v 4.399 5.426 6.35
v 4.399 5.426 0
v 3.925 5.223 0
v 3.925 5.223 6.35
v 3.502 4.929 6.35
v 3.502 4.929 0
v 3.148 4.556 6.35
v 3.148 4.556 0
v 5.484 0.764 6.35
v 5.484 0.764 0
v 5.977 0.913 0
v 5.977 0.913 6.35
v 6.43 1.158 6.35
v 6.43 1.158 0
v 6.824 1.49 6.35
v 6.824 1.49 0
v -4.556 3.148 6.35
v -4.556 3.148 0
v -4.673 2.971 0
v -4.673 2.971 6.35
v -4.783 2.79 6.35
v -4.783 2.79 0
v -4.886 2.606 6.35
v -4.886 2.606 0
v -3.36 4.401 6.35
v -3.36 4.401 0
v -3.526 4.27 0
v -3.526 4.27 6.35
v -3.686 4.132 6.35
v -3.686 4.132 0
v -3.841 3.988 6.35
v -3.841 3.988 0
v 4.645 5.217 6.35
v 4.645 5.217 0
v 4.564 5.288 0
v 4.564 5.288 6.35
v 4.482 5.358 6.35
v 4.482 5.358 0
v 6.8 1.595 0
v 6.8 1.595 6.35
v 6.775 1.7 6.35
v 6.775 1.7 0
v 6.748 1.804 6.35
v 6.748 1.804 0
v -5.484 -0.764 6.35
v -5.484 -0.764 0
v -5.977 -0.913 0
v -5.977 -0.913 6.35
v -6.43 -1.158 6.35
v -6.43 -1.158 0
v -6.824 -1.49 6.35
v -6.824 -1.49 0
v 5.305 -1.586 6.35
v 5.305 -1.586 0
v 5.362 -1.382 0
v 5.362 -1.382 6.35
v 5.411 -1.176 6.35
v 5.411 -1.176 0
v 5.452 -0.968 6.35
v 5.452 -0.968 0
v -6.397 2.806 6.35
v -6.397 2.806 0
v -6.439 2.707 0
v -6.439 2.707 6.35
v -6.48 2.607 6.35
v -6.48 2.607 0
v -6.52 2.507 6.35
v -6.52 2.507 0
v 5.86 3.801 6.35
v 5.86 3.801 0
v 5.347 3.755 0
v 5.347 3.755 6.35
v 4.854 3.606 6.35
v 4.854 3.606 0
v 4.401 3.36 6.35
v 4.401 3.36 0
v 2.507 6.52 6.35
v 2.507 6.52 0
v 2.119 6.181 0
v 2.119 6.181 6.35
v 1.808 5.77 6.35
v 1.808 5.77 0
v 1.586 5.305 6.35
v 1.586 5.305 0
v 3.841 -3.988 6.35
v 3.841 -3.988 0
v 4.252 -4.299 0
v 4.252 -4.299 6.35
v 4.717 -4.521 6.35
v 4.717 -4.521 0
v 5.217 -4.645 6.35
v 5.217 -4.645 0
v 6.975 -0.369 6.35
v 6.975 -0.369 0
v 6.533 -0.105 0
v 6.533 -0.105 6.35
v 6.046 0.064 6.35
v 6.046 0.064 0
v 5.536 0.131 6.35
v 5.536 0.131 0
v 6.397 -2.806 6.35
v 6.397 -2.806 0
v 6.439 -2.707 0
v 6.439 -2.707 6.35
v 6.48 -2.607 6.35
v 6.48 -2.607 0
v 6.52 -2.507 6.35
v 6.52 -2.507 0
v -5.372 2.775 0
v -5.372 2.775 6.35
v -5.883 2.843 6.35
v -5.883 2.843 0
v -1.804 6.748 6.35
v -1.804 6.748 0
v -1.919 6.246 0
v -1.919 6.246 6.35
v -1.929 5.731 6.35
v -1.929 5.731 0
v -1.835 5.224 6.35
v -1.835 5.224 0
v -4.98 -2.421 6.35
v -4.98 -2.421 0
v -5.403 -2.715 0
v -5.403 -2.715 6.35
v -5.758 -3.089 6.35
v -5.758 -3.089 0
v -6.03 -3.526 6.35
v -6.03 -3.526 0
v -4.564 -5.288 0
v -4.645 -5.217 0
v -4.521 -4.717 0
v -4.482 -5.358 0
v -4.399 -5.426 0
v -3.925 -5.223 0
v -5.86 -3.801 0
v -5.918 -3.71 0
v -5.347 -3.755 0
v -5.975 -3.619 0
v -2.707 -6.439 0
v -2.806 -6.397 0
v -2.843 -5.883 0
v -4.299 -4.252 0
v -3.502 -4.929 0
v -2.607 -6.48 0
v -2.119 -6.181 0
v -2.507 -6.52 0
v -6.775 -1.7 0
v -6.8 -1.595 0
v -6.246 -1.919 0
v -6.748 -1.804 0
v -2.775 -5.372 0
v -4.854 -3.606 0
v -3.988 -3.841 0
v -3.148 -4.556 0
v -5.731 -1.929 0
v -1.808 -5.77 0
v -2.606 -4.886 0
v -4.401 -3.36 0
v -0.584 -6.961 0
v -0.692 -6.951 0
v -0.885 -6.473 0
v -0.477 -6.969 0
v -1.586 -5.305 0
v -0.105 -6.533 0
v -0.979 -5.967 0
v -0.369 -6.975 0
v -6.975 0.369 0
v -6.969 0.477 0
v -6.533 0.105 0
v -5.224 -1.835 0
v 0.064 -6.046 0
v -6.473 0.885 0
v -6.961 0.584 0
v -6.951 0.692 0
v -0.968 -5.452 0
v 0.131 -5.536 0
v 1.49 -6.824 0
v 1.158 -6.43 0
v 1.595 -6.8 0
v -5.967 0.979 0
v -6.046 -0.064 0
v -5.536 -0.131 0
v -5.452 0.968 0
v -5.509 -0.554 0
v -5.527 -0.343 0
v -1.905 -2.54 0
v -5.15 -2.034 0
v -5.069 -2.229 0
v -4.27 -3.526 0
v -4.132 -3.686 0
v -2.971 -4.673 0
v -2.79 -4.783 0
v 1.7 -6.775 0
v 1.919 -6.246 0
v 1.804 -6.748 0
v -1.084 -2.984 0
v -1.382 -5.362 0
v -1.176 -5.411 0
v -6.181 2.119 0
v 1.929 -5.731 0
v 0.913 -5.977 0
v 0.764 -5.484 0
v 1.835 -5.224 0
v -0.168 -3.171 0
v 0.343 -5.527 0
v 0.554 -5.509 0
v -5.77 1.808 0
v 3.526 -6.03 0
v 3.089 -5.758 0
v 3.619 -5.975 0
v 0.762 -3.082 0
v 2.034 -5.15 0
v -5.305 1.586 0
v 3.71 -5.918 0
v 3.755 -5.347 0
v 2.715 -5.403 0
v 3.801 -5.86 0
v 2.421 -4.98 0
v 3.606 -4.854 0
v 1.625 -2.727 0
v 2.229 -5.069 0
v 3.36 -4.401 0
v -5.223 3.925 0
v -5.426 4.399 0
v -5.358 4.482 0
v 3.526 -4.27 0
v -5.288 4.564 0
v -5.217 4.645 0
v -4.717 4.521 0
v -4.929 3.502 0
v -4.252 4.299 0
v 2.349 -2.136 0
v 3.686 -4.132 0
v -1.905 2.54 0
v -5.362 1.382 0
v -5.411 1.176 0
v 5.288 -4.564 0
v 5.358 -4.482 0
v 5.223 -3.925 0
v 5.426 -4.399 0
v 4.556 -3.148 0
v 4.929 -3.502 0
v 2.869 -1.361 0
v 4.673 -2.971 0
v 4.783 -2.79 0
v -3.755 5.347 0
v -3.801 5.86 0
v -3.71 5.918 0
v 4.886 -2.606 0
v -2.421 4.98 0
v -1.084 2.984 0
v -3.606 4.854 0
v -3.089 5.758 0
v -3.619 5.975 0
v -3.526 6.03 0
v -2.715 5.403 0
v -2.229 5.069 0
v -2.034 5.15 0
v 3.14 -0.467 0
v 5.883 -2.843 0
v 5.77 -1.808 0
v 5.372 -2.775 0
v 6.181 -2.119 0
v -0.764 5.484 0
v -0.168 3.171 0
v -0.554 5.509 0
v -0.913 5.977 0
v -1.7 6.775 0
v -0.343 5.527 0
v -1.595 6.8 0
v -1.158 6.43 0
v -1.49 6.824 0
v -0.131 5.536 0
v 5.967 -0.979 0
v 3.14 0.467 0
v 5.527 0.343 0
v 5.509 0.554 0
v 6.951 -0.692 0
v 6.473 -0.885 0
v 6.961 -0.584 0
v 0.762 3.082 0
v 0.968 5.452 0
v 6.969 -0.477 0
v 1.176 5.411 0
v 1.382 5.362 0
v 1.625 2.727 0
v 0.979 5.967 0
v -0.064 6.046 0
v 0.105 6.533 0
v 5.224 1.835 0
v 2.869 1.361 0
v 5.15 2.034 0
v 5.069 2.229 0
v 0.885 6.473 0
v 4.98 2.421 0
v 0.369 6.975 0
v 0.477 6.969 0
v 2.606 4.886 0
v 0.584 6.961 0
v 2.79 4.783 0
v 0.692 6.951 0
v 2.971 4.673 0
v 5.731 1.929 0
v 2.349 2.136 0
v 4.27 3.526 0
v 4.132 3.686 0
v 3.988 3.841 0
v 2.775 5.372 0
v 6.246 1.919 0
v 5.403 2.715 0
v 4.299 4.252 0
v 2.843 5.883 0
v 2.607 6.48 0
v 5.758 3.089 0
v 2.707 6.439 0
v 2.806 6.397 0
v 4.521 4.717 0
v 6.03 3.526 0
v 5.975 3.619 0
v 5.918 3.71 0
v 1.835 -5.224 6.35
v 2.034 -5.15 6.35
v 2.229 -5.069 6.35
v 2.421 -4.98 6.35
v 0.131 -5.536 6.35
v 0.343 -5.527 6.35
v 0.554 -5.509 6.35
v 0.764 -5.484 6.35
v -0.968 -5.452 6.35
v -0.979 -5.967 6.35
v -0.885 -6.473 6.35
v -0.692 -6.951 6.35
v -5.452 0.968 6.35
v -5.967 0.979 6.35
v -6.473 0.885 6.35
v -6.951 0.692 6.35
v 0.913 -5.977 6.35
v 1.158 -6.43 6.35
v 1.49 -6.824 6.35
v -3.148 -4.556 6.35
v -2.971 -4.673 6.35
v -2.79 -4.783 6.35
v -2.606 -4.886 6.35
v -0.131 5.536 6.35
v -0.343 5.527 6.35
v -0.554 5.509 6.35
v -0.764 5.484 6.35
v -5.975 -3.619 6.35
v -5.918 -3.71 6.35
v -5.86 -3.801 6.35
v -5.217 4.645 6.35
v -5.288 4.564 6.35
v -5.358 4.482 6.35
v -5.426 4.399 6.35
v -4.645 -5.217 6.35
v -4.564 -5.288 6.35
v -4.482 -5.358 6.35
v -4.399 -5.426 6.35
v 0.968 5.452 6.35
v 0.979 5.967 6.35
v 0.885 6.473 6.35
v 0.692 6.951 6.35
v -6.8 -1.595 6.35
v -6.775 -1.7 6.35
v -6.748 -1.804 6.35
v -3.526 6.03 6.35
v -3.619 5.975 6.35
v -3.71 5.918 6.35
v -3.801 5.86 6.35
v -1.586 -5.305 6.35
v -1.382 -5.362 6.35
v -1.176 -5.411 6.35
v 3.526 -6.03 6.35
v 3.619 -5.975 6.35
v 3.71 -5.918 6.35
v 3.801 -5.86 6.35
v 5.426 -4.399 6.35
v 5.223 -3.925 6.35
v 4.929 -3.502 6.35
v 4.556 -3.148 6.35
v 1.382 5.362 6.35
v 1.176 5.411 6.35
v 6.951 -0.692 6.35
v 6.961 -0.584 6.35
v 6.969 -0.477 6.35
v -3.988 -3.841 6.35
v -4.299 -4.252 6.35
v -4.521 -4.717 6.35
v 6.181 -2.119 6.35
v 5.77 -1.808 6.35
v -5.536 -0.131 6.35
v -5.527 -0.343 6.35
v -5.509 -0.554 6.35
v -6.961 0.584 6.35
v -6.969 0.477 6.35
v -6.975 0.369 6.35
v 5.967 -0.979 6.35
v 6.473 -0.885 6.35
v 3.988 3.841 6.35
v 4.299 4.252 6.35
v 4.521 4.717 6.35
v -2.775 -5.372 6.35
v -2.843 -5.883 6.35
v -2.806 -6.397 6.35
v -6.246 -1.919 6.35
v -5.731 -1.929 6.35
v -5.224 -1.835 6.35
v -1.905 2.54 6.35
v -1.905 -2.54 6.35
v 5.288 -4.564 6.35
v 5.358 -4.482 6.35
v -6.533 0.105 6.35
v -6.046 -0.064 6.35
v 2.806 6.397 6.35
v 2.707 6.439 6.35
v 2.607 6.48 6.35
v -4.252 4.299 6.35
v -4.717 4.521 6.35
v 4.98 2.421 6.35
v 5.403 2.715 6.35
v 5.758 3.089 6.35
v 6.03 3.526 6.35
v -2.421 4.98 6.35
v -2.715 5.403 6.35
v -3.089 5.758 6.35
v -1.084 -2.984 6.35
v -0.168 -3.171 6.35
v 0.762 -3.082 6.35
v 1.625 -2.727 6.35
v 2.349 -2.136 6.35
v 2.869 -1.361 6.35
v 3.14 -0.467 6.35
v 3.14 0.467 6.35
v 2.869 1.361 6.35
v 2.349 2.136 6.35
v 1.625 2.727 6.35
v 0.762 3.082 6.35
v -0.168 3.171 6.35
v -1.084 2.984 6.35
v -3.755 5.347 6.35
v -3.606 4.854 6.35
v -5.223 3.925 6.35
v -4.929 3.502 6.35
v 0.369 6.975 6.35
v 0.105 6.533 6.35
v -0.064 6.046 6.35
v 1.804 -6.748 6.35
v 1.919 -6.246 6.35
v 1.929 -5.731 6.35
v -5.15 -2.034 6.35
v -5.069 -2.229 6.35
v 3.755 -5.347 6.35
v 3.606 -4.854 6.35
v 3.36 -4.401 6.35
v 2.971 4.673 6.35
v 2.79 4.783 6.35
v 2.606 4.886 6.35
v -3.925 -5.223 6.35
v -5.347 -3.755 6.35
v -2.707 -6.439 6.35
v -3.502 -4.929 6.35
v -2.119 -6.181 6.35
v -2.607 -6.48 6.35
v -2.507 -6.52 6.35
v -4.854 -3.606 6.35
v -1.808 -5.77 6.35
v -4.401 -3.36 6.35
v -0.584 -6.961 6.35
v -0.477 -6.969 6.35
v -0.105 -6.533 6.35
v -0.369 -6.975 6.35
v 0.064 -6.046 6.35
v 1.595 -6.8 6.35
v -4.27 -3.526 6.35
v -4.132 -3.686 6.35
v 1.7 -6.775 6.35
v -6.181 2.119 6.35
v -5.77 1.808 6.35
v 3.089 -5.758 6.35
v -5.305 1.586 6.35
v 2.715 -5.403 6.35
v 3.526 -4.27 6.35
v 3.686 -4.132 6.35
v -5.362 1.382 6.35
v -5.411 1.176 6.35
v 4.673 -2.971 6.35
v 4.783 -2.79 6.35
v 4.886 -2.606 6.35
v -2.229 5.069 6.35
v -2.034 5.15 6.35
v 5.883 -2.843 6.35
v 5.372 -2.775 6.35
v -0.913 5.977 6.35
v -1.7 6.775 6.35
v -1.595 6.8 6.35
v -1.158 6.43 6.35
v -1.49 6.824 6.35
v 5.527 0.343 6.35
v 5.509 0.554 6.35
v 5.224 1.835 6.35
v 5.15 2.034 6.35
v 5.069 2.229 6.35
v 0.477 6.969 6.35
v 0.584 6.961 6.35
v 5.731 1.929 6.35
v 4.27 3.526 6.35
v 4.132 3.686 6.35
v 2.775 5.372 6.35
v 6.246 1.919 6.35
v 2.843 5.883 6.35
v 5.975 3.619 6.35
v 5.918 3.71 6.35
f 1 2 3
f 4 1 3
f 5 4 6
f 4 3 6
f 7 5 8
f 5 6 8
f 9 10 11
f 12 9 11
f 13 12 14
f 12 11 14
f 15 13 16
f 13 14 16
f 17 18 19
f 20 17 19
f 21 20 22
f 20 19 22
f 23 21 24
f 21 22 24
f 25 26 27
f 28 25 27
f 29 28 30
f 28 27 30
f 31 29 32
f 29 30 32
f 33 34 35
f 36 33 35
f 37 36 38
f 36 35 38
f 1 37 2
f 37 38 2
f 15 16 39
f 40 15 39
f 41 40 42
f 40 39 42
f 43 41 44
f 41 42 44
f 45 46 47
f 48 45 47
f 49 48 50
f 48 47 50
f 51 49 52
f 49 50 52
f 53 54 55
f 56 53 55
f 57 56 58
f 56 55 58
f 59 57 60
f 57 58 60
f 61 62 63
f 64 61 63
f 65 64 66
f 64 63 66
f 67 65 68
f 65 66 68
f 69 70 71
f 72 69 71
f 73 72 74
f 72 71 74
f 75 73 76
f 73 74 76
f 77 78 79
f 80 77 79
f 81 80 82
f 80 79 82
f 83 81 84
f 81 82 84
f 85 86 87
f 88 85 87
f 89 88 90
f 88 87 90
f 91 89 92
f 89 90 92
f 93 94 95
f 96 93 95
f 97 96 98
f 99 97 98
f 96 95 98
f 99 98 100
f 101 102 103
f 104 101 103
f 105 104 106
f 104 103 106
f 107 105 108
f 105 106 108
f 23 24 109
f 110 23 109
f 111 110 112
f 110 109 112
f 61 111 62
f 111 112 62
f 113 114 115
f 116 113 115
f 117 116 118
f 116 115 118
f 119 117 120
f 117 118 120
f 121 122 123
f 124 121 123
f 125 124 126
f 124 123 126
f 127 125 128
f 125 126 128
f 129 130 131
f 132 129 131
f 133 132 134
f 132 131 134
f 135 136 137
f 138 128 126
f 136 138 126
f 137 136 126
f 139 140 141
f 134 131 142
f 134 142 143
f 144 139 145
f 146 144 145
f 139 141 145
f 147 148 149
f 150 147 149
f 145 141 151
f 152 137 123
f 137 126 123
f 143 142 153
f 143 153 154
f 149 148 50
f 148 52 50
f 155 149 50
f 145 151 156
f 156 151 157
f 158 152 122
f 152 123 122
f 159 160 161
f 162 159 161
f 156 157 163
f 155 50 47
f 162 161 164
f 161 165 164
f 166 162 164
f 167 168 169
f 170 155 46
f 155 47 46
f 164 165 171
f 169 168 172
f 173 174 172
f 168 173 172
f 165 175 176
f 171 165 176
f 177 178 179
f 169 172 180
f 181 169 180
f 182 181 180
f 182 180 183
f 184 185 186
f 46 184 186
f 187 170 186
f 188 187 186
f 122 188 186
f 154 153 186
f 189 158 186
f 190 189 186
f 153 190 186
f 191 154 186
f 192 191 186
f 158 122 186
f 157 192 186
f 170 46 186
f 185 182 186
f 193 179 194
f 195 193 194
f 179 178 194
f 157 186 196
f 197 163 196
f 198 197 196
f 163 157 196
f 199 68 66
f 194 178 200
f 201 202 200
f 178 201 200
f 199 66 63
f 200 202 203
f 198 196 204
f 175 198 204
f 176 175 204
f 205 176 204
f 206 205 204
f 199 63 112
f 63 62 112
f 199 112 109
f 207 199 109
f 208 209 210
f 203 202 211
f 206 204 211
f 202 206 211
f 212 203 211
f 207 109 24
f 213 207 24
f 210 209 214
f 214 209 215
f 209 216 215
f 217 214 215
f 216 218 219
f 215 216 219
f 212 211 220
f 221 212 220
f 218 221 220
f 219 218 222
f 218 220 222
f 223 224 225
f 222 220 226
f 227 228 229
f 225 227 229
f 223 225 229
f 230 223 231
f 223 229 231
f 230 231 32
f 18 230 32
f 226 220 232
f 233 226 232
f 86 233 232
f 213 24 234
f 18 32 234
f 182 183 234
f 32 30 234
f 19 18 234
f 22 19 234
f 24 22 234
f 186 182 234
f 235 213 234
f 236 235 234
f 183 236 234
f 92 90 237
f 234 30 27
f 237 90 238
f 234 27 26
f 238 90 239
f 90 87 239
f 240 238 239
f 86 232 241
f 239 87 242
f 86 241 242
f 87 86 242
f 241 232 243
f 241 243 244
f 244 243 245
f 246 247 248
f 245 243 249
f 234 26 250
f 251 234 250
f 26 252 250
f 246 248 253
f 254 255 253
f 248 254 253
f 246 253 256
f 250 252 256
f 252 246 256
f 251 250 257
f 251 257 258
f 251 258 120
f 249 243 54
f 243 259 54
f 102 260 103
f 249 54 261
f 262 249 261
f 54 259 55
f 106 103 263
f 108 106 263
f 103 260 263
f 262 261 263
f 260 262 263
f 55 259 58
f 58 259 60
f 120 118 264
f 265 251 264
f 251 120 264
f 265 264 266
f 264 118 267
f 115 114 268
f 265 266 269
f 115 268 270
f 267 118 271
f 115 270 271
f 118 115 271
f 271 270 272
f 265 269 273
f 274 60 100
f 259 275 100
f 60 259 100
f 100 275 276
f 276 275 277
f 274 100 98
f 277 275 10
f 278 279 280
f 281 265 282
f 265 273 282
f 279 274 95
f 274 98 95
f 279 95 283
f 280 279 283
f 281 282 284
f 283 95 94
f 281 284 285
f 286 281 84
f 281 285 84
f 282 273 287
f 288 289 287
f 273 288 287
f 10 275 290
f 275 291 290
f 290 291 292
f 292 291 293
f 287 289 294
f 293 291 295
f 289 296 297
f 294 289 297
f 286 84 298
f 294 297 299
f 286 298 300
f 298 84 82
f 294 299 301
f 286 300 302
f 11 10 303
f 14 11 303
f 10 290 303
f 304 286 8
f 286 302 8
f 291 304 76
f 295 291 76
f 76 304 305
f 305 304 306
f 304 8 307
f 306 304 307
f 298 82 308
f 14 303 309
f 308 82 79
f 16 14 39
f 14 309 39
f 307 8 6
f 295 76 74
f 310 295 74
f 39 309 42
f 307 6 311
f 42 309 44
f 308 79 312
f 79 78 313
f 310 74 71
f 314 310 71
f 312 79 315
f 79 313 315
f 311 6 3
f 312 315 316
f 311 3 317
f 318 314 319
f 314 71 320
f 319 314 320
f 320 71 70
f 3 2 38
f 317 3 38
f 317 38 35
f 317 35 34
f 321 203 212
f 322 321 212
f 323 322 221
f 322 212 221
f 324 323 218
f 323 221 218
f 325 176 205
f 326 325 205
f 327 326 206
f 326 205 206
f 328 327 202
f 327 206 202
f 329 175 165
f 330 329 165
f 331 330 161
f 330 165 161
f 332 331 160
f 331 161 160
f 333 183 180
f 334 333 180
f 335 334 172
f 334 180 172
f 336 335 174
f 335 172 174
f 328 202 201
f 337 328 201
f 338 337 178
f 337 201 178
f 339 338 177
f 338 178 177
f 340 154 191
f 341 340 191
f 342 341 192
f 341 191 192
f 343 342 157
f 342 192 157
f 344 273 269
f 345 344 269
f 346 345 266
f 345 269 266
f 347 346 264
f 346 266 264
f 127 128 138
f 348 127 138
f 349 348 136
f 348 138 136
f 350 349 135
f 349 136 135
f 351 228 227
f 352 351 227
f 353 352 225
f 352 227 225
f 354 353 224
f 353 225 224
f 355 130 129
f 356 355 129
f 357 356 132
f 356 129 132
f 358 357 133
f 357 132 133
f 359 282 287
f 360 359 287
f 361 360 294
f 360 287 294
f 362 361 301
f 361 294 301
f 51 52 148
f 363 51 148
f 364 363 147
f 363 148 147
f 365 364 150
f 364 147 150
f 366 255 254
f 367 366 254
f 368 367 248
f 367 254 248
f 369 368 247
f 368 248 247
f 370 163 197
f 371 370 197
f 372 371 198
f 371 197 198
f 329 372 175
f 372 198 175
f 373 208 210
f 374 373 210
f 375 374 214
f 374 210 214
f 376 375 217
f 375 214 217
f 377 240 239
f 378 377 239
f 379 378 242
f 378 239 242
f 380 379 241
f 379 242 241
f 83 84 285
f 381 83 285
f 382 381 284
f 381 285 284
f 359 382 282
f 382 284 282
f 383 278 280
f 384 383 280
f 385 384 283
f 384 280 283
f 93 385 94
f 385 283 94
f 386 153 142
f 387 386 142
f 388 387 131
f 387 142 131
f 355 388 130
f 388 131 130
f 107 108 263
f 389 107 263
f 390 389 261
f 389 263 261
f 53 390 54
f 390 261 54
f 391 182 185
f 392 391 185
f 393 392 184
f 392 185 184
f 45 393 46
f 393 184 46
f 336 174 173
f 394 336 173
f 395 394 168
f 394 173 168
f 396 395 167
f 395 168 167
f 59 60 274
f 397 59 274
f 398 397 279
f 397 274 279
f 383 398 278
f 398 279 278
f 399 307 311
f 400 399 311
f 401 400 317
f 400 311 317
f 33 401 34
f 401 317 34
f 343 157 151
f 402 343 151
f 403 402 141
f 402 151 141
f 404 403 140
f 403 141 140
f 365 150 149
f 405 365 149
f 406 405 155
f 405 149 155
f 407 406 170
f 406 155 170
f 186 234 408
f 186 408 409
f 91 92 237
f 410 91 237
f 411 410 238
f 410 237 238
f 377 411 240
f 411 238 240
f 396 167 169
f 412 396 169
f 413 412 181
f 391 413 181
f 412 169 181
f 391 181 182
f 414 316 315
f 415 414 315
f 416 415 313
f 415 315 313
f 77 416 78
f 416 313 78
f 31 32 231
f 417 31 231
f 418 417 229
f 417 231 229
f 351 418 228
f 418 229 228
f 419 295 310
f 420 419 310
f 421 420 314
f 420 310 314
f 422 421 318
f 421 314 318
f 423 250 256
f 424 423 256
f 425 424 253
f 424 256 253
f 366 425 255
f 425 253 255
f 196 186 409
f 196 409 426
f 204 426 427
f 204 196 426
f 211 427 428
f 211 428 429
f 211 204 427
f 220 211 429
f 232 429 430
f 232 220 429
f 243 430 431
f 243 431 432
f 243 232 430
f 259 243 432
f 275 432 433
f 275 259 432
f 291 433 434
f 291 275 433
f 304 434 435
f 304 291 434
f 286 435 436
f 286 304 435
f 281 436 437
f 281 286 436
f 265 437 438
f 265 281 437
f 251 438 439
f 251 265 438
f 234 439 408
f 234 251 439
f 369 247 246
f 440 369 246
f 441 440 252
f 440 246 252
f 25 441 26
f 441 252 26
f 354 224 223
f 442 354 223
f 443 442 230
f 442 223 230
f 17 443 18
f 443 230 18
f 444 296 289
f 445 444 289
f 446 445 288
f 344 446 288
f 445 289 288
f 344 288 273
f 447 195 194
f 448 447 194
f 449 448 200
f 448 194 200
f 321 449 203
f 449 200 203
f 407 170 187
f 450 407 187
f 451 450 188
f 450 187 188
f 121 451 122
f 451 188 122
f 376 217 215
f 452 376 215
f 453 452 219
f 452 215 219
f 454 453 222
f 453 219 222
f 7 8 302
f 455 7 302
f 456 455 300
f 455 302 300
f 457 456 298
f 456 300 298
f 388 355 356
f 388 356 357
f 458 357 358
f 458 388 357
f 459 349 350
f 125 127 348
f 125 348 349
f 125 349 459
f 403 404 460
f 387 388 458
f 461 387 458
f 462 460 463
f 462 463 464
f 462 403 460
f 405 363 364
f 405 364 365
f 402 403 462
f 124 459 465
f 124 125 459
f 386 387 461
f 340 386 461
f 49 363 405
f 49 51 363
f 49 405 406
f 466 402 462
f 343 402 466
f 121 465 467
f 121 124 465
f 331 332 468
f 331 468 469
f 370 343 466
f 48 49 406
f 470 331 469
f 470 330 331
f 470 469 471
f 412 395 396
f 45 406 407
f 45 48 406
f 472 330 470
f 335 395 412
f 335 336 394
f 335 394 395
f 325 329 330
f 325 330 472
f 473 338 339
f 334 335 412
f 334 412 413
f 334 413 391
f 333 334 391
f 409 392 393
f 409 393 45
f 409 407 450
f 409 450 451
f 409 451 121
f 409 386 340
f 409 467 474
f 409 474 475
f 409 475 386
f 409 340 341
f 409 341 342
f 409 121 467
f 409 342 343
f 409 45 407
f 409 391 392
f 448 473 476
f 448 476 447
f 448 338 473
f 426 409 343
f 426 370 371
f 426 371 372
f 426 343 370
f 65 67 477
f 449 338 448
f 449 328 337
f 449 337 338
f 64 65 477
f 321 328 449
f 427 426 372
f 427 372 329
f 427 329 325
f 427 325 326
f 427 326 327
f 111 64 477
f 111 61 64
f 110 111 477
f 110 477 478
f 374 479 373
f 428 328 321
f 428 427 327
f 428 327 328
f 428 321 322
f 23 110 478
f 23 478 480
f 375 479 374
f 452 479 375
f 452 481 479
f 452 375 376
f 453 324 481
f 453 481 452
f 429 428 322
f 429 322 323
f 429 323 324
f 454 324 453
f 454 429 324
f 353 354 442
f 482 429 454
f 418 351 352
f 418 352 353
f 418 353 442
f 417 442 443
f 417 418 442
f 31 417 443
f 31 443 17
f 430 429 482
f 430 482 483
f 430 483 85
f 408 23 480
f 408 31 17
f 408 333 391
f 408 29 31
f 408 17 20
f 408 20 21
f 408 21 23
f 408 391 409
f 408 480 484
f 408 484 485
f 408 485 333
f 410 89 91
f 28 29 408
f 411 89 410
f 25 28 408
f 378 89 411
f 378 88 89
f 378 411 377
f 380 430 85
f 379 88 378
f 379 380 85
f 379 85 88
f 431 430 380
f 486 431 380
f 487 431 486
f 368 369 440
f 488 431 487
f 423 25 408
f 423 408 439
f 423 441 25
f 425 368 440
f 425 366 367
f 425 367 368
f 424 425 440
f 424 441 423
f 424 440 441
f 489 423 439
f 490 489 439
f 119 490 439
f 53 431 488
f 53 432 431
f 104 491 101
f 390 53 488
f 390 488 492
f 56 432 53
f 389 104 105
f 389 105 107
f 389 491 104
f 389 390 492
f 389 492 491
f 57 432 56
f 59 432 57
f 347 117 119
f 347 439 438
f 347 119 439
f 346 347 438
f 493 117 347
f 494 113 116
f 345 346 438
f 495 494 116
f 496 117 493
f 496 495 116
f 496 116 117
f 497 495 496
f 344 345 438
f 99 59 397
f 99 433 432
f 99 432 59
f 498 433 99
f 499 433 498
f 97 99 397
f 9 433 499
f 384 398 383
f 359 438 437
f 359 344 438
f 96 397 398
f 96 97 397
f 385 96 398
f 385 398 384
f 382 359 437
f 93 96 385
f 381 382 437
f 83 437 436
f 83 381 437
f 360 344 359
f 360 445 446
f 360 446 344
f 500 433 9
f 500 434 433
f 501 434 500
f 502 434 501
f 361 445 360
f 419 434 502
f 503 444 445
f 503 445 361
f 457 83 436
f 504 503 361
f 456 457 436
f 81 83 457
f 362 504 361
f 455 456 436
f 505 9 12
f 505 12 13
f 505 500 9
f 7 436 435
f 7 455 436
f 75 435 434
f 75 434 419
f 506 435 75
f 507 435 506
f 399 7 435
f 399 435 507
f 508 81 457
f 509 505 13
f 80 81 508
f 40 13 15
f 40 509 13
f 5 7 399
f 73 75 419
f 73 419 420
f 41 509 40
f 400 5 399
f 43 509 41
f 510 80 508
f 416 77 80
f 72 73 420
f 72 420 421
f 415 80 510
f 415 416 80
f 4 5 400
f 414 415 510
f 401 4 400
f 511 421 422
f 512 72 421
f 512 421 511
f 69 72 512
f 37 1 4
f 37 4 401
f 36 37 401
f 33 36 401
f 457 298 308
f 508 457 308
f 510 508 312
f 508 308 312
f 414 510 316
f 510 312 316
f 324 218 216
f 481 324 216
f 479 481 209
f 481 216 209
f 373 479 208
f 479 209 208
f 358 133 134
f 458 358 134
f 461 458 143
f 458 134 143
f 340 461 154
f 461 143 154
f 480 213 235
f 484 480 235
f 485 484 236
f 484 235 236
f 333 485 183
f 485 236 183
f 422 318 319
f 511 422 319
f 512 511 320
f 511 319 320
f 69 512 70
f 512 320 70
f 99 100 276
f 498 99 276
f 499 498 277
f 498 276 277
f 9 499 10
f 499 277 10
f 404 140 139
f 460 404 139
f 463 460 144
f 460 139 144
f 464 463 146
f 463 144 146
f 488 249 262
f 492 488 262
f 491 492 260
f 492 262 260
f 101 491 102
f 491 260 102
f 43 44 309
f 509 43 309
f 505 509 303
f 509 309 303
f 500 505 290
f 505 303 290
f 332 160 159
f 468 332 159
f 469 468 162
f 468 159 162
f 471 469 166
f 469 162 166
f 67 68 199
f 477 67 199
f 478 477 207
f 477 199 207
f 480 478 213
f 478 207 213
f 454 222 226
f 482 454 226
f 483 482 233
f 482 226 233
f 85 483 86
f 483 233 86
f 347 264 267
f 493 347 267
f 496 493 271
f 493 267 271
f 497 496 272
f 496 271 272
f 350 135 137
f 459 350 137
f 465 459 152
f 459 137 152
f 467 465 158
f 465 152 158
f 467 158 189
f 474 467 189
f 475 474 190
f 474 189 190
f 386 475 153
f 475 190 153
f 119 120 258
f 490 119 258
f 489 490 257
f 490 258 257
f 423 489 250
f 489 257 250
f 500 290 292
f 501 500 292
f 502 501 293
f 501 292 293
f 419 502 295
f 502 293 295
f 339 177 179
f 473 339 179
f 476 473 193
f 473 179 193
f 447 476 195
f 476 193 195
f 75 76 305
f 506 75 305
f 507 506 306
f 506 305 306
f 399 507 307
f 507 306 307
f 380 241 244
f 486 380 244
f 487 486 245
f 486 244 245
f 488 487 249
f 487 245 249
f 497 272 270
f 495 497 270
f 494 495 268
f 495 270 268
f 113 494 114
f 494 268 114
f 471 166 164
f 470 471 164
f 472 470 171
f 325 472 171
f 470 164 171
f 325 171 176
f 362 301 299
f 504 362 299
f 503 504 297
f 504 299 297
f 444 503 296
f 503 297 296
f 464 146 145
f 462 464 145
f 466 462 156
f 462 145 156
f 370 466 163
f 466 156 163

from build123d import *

# Parameters (mm, degrees)
BOSS_EXTRUDE1_DEPTH = 6.35


with BuildPart() as part:
    # Sketch1 → Boss-Extrude1 (new body)
    with BuildSketch(Plane.XY):
        with BuildLine():
            ThreePointArc((5.8600974, 3.801247619), (5.096802915, 3.692613372), (4.401264234, 3.359978717))
            ThreePointArc((4.401264234, 3.359978717), (4.201500823, 3.606656994), (3.987930607, 3.841483218))
            ThreePointArc((3.987930607, 3.841483218), (4.422090523, 4.478605685), (4.645099136, 5.216634837))
            ThreePointArc((4.645099136, 5.216634837), (4.523078796, 5.32277965), (4.398633704, 5.426071004))
            ThreePointArc((4.398633704, 5.426071004), (3.706267339, 5.086882728), (3.147560505, 4.555595099))
            ThreePointArc((3.147560505, 4.555595099), (2.881346432, 4.728469793), (2.605663792, 4.885805977))
            ThreePointArc((2.605663792, 4.885805977), (2.82169274, 5.625908243), (2.805722984, 6.396729128))
            ThreePointArc((2.805722984, 6.396729128), (2.656874194, 6.459972486), (2.506601094, 6.519752753))
            ThreePointArc((2.506601094, 6.519752753), (1.952936493, 5.983212559), (1.585751624, 5.305278091))
            ThreePointArc((1.585751624, 5.305278091), (1.279145776, 5.387427022), (0.968336451, 5.451872005))
            ThreePointArc((0.968336451, 5.451872005), (0.945088011, 6.222507704), (0.691703118, 6.950667004))
            ThreePointArc((0.691703118, 6.950667004), (0.530596234, 6.964818206), (0.369204905, 6.975235676))
            ThreePointArc((0.369204905, 6.975235676), (0.008438615, 6.293863858), (-0.131281675, 5.5356435))
            ThreePointArc((-0.131281675, 5.5356435), (-0.44826658, 5.519025359), (-0.763778409, 5.484270816))
            ThreePointArc((-0.763778409, 5.484270816), (-1.024028517, 6.210004756), (-1.490025469, 6.824225165))
            ThreePointArc((-1.490025469, 6.824225165), (-1.647620183, 6.787898993), (-1.804331633, 6.747933933))
            ThreePointArc((-1.804331633, 6.747933933), (-1.936885292, 5.98842791), (-1.835464209, 5.224141554))
            ThreePointArc((-1.835464209, 5.224141554), (-2.13179948, 5.11038304), (-2.421129317, 4.979830988))
            ThreePointArc((-2.421129317, 4.979830988), (-2.892905998, 5.589623275), (-3.525899981, 6.02978062))
            ThreePointArc((-3.525899981, 6.02978062), (-3.664556056, 5.946532932), (-3.801247619, 5.8600974))
            ThreePointArc((-3.801247619, 5.8600974), (-3.692613372, 5.096802915), (-3.359978717, 4.401264234))
            ThreePointArc((-3.359978717, 4.401264234), (-3.606656994, 4.201500823), (-3.841483218, 3.987930607))
            ThreePointArc((-3.841483218, 3.987930607), (-4.478605685, 4.422090523), (-5.216634837, 4.645099136))
            ThreePointArc((-5.216634837, 4.645099136), (-5.32277965, 4.523078796), (-5.426071004, 4.398633704))
            ThreePointArc((-5.426071004, 4.398633704), (-5.086882728, 3.706267339), (-4.555595099, 3.147560505))
            ThreePointArc((-4.555595099, 3.147560505), (-4.728469793, 2.881346432), (-4.885805977, 2.605663792))
            ThreePointArc((-4.885805977, 2.605663792), (-5.625908243, 2.82169274), (-6.396729128, 2.805722984))
            ThreePointArc((-6.396729128, 2.805722984), (-6.459972486, 2.656874194), (-6.519752753, 2.506601094))
            ThreePointArc((-6.519752753, 2.506601094), (-5.983212559, 1.952936493), (-5.305278091, 1.585751624))
            ThreePointArc((-5.305278091, 1.585751624), (-5.387427022, 1.279145776), (-5.451872005, 0.968336451))
            ThreePointArc((-5.451872005, 0.968336451), (-6.222507704, 0.945088011), (-6.950667004, 0.691703118))
            ThreePointArc((-6.950667004, 0.691703118), (-6.964818206, 0.530596234), (-6.975235676, 0.369204905))
            ThreePointArc((-6.975235676, 0.369204905), (-6.293863858, 0.008438615), (-5.5356435, -0.131281675))
            ThreePointArc((-5.5356435, -0.131281675), (-5.519025359, -0.44826658), (-5.484270816, -0.763778409))
            ThreePointArc((-5.484270816, -0.763778409), (-6.210004756, -1.024028517), (-6.824225165, -1.490025469))
            ThreePointArc((-6.824225165, -1.490025469), (-6.787898993, -1.647620183), (-6.747933933, -1.804331633))
            ThreePointArc((-6.747933933, -1.804331633), (-5.98842791, -1.936885292), (-5.224141554, -1.835464209))
            ThreePointArc((-5.224141554, -1.835464209), (-5.11038304, -2.13179948), (-4.979830988, -2.421129317))
            ThreePointArc((-4.979830988, -2.421129317), (-5.589623275, -2.892905998), (-6.02978062, -3.525899981))
            ThreePointArc((-6.02978062, -3.525899981), (-5.946532932, -3.664556056), (-5.8600974, -3.801247619))
            ThreePointArc((-5.8600974, -3.801247619), (-5.096802915, -3.692613372), (-4.401264234, -3.359978717))
            ThreePointArc((-4.401264234, -3.359978717), (-4.201500823, -3.606656994), (-3.987930607, -3.841483218))
            ThreePointArc((-3.987930607, -3.841483218), (-4.422090523, -4.478605685), (-4.645099136, -5.216634837))
            ThreePointArc((-4.645099136, -5.216634837), (-4.523078796, -5.32277965), (-4.398633704, -5.426071004))
            ThreePointArc((-4.398633704, -5.426071004), (-3.706267339, -5.086882728), (-3.147560505, -4.555595099))
            ThreePointArc((-3.147560505, -4.555595099), (-2.881346432, -4.728469793), (-2.605663792, -4.885805977))
            ThreePointArc((-2.605663792, -4.885805977), (-2.82169274, -5.625908243), (-2.805722984, -6.396729128))
            ThreePointArc((-2.805722984, -6.396729128), (-2.656874194, -6.459972486), (-2.506601094, -6.519752753))
            ThreePointArc((-2.506601094, -6.519752753), (-1.952936493, -5.983212559), (-1.585751624, -5.305278091))
            ThreePointArc((-1.585751624, -5.305278091), (-1.279145776, -5.387427022), (-0.968336451, -5.451872005))
            ThreePointArc((-0.968336451, -5.451872005), (-0.945088011, -6.222507704), (-0.691703118, -6.950667004))
            ThreePointArc((-0.691703118, -6.950667004), (-0.530596234, -6.964818206), (-0.369204905, -6.975235676))
            ThreePointArc((-0.369204905, -6.975235676), (-0.008438615, -6.293863858), (0.131281675, -5.5356435))
            ThreePointArc((0.131281675, -5.5356435), (0.44826658, -5.519025359), (0.763778409, -5.484270816))
            ThreePointArc((0.763778409, -5.484270816), (1.024028517, -6.210004756), (1.490025469, -6.824225165))
            ThreePointArc((1.490025469, -6.824225165), (1.647620183, -6.787898993), (1.804331633, -6.747933933))
            ThreePointArc((1.804331633, -6.747933933), (1.936885292, -5.98842791), (1.835464209, -5.224141554))
            ThreePointArc((1.835464209, -5.224141554), (2.13179948, -5.11038304), (2.421129317, -4.979830988))
            ThreePointArc((2.421129317, -4.979830988), (2.892905998, -5.589623275), (3.525899981, -6.02978062))
            ThreePointArc((3.525899981, -6.02978062), (3.664556056, -5.946532932), (3.801247619, -5.8600974))
            ThreePointArc((3.801247619, -5.8600974), (3.692613372, -5.096802915), (3.359978717, -4.401264234))
            ThreePointArc((3.359978717, -4.401264234), (3.606656994, -4.201500823), (3.841483218, -3.987930607))
            ThreePointArc((3.841483218, -3.987930607), (4.478605685, -4.422090523), (5.216634837, -4.645099136))
            ThreePointArc((5.216634837, -4.645099136), (5.32277965, -4.523078796), (5.426071004, -4.398633704))
            ThreePointArc((5.426071004, -4.398633704), (5.086882728, -3.706267339), (4.555595099, -3.147560505))
            ThreePointArc((4.555595099, -3.147560505), (4.728469793, -2.881346432), (4.885805977, -2.605663792))
            ThreePointArc((4.885805977, -2.605663792), (5.625908243, -2.82169274), (6.396729128, -2.805722984))
            ThreePointArc((6.396729128, -2.805722984), (6.459972486, -2.656874194), (6.519752753, -2.506601094))
            ThreePointArc((6.519752753, -2.506601094), (5.983212559, -1.952936493), (5.305278091, -1.585751624))
            ThreePointArc((5.305278091, -1.585751624), (5.387427022, -1.279145776), (5.451872005, -0.968336451))
            ThreePointArc((5.451872005, -0.968336451), (6.222507704, -0.945088011), (6.950667004, -0.691703118))
            ThreePointArc((6.950667004, -0.691703118), (6.964818206, -0.530596234), (6.975235676, -0.369204905))
            ThreePointArc((6.975235676, -0.369204905), (6.293863858, -0.008438615), (5.5356435, 0.131281675))
            ThreePointArc((5.5356435, 0.131281675), (5.519025359, 0.44826658), (5.484270816, 0.763778409))
            ThreePointArc((5.484270816, 0.763778409), (6.210004756, 1.024028517), (6.824225165, 1.490025469))
            ThreePointArc((6.824225165, 1.490025469), (6.787898993, 1.647620183), (6.747933933, 1.804331633))
            ThreePointArc((6.747933933, 1.804331633), (5.98842791, 1.936885292), (5.224141554, 1.835464209))
            ThreePointArc((5.224141554, 1.835464209), (5.11038304, 2.13179948), (4.979830988, 2.421129317))
            ThreePointArc((4.979830988, 2.421129317), (5.589623275, 2.892905998), (6.02978062, 3.525899981))
            ThreePointArc((6.02978062, 3.525899981), (5.946532932, 3.664556056), (5.8600974, 3.801247619))
        make_face()
        with BuildLine():
            Line((-1.905, 2.54), (-1.905, -2.54))
            ThreePointArc((-1.905, -2.54), (3.175, 0), (-1.905, 2.54))
        make_face(mode=Mode.SUBTRACT)
    extrude(amount=BOSS_EXTRUDE1_DEPTH)


solid = part.part
